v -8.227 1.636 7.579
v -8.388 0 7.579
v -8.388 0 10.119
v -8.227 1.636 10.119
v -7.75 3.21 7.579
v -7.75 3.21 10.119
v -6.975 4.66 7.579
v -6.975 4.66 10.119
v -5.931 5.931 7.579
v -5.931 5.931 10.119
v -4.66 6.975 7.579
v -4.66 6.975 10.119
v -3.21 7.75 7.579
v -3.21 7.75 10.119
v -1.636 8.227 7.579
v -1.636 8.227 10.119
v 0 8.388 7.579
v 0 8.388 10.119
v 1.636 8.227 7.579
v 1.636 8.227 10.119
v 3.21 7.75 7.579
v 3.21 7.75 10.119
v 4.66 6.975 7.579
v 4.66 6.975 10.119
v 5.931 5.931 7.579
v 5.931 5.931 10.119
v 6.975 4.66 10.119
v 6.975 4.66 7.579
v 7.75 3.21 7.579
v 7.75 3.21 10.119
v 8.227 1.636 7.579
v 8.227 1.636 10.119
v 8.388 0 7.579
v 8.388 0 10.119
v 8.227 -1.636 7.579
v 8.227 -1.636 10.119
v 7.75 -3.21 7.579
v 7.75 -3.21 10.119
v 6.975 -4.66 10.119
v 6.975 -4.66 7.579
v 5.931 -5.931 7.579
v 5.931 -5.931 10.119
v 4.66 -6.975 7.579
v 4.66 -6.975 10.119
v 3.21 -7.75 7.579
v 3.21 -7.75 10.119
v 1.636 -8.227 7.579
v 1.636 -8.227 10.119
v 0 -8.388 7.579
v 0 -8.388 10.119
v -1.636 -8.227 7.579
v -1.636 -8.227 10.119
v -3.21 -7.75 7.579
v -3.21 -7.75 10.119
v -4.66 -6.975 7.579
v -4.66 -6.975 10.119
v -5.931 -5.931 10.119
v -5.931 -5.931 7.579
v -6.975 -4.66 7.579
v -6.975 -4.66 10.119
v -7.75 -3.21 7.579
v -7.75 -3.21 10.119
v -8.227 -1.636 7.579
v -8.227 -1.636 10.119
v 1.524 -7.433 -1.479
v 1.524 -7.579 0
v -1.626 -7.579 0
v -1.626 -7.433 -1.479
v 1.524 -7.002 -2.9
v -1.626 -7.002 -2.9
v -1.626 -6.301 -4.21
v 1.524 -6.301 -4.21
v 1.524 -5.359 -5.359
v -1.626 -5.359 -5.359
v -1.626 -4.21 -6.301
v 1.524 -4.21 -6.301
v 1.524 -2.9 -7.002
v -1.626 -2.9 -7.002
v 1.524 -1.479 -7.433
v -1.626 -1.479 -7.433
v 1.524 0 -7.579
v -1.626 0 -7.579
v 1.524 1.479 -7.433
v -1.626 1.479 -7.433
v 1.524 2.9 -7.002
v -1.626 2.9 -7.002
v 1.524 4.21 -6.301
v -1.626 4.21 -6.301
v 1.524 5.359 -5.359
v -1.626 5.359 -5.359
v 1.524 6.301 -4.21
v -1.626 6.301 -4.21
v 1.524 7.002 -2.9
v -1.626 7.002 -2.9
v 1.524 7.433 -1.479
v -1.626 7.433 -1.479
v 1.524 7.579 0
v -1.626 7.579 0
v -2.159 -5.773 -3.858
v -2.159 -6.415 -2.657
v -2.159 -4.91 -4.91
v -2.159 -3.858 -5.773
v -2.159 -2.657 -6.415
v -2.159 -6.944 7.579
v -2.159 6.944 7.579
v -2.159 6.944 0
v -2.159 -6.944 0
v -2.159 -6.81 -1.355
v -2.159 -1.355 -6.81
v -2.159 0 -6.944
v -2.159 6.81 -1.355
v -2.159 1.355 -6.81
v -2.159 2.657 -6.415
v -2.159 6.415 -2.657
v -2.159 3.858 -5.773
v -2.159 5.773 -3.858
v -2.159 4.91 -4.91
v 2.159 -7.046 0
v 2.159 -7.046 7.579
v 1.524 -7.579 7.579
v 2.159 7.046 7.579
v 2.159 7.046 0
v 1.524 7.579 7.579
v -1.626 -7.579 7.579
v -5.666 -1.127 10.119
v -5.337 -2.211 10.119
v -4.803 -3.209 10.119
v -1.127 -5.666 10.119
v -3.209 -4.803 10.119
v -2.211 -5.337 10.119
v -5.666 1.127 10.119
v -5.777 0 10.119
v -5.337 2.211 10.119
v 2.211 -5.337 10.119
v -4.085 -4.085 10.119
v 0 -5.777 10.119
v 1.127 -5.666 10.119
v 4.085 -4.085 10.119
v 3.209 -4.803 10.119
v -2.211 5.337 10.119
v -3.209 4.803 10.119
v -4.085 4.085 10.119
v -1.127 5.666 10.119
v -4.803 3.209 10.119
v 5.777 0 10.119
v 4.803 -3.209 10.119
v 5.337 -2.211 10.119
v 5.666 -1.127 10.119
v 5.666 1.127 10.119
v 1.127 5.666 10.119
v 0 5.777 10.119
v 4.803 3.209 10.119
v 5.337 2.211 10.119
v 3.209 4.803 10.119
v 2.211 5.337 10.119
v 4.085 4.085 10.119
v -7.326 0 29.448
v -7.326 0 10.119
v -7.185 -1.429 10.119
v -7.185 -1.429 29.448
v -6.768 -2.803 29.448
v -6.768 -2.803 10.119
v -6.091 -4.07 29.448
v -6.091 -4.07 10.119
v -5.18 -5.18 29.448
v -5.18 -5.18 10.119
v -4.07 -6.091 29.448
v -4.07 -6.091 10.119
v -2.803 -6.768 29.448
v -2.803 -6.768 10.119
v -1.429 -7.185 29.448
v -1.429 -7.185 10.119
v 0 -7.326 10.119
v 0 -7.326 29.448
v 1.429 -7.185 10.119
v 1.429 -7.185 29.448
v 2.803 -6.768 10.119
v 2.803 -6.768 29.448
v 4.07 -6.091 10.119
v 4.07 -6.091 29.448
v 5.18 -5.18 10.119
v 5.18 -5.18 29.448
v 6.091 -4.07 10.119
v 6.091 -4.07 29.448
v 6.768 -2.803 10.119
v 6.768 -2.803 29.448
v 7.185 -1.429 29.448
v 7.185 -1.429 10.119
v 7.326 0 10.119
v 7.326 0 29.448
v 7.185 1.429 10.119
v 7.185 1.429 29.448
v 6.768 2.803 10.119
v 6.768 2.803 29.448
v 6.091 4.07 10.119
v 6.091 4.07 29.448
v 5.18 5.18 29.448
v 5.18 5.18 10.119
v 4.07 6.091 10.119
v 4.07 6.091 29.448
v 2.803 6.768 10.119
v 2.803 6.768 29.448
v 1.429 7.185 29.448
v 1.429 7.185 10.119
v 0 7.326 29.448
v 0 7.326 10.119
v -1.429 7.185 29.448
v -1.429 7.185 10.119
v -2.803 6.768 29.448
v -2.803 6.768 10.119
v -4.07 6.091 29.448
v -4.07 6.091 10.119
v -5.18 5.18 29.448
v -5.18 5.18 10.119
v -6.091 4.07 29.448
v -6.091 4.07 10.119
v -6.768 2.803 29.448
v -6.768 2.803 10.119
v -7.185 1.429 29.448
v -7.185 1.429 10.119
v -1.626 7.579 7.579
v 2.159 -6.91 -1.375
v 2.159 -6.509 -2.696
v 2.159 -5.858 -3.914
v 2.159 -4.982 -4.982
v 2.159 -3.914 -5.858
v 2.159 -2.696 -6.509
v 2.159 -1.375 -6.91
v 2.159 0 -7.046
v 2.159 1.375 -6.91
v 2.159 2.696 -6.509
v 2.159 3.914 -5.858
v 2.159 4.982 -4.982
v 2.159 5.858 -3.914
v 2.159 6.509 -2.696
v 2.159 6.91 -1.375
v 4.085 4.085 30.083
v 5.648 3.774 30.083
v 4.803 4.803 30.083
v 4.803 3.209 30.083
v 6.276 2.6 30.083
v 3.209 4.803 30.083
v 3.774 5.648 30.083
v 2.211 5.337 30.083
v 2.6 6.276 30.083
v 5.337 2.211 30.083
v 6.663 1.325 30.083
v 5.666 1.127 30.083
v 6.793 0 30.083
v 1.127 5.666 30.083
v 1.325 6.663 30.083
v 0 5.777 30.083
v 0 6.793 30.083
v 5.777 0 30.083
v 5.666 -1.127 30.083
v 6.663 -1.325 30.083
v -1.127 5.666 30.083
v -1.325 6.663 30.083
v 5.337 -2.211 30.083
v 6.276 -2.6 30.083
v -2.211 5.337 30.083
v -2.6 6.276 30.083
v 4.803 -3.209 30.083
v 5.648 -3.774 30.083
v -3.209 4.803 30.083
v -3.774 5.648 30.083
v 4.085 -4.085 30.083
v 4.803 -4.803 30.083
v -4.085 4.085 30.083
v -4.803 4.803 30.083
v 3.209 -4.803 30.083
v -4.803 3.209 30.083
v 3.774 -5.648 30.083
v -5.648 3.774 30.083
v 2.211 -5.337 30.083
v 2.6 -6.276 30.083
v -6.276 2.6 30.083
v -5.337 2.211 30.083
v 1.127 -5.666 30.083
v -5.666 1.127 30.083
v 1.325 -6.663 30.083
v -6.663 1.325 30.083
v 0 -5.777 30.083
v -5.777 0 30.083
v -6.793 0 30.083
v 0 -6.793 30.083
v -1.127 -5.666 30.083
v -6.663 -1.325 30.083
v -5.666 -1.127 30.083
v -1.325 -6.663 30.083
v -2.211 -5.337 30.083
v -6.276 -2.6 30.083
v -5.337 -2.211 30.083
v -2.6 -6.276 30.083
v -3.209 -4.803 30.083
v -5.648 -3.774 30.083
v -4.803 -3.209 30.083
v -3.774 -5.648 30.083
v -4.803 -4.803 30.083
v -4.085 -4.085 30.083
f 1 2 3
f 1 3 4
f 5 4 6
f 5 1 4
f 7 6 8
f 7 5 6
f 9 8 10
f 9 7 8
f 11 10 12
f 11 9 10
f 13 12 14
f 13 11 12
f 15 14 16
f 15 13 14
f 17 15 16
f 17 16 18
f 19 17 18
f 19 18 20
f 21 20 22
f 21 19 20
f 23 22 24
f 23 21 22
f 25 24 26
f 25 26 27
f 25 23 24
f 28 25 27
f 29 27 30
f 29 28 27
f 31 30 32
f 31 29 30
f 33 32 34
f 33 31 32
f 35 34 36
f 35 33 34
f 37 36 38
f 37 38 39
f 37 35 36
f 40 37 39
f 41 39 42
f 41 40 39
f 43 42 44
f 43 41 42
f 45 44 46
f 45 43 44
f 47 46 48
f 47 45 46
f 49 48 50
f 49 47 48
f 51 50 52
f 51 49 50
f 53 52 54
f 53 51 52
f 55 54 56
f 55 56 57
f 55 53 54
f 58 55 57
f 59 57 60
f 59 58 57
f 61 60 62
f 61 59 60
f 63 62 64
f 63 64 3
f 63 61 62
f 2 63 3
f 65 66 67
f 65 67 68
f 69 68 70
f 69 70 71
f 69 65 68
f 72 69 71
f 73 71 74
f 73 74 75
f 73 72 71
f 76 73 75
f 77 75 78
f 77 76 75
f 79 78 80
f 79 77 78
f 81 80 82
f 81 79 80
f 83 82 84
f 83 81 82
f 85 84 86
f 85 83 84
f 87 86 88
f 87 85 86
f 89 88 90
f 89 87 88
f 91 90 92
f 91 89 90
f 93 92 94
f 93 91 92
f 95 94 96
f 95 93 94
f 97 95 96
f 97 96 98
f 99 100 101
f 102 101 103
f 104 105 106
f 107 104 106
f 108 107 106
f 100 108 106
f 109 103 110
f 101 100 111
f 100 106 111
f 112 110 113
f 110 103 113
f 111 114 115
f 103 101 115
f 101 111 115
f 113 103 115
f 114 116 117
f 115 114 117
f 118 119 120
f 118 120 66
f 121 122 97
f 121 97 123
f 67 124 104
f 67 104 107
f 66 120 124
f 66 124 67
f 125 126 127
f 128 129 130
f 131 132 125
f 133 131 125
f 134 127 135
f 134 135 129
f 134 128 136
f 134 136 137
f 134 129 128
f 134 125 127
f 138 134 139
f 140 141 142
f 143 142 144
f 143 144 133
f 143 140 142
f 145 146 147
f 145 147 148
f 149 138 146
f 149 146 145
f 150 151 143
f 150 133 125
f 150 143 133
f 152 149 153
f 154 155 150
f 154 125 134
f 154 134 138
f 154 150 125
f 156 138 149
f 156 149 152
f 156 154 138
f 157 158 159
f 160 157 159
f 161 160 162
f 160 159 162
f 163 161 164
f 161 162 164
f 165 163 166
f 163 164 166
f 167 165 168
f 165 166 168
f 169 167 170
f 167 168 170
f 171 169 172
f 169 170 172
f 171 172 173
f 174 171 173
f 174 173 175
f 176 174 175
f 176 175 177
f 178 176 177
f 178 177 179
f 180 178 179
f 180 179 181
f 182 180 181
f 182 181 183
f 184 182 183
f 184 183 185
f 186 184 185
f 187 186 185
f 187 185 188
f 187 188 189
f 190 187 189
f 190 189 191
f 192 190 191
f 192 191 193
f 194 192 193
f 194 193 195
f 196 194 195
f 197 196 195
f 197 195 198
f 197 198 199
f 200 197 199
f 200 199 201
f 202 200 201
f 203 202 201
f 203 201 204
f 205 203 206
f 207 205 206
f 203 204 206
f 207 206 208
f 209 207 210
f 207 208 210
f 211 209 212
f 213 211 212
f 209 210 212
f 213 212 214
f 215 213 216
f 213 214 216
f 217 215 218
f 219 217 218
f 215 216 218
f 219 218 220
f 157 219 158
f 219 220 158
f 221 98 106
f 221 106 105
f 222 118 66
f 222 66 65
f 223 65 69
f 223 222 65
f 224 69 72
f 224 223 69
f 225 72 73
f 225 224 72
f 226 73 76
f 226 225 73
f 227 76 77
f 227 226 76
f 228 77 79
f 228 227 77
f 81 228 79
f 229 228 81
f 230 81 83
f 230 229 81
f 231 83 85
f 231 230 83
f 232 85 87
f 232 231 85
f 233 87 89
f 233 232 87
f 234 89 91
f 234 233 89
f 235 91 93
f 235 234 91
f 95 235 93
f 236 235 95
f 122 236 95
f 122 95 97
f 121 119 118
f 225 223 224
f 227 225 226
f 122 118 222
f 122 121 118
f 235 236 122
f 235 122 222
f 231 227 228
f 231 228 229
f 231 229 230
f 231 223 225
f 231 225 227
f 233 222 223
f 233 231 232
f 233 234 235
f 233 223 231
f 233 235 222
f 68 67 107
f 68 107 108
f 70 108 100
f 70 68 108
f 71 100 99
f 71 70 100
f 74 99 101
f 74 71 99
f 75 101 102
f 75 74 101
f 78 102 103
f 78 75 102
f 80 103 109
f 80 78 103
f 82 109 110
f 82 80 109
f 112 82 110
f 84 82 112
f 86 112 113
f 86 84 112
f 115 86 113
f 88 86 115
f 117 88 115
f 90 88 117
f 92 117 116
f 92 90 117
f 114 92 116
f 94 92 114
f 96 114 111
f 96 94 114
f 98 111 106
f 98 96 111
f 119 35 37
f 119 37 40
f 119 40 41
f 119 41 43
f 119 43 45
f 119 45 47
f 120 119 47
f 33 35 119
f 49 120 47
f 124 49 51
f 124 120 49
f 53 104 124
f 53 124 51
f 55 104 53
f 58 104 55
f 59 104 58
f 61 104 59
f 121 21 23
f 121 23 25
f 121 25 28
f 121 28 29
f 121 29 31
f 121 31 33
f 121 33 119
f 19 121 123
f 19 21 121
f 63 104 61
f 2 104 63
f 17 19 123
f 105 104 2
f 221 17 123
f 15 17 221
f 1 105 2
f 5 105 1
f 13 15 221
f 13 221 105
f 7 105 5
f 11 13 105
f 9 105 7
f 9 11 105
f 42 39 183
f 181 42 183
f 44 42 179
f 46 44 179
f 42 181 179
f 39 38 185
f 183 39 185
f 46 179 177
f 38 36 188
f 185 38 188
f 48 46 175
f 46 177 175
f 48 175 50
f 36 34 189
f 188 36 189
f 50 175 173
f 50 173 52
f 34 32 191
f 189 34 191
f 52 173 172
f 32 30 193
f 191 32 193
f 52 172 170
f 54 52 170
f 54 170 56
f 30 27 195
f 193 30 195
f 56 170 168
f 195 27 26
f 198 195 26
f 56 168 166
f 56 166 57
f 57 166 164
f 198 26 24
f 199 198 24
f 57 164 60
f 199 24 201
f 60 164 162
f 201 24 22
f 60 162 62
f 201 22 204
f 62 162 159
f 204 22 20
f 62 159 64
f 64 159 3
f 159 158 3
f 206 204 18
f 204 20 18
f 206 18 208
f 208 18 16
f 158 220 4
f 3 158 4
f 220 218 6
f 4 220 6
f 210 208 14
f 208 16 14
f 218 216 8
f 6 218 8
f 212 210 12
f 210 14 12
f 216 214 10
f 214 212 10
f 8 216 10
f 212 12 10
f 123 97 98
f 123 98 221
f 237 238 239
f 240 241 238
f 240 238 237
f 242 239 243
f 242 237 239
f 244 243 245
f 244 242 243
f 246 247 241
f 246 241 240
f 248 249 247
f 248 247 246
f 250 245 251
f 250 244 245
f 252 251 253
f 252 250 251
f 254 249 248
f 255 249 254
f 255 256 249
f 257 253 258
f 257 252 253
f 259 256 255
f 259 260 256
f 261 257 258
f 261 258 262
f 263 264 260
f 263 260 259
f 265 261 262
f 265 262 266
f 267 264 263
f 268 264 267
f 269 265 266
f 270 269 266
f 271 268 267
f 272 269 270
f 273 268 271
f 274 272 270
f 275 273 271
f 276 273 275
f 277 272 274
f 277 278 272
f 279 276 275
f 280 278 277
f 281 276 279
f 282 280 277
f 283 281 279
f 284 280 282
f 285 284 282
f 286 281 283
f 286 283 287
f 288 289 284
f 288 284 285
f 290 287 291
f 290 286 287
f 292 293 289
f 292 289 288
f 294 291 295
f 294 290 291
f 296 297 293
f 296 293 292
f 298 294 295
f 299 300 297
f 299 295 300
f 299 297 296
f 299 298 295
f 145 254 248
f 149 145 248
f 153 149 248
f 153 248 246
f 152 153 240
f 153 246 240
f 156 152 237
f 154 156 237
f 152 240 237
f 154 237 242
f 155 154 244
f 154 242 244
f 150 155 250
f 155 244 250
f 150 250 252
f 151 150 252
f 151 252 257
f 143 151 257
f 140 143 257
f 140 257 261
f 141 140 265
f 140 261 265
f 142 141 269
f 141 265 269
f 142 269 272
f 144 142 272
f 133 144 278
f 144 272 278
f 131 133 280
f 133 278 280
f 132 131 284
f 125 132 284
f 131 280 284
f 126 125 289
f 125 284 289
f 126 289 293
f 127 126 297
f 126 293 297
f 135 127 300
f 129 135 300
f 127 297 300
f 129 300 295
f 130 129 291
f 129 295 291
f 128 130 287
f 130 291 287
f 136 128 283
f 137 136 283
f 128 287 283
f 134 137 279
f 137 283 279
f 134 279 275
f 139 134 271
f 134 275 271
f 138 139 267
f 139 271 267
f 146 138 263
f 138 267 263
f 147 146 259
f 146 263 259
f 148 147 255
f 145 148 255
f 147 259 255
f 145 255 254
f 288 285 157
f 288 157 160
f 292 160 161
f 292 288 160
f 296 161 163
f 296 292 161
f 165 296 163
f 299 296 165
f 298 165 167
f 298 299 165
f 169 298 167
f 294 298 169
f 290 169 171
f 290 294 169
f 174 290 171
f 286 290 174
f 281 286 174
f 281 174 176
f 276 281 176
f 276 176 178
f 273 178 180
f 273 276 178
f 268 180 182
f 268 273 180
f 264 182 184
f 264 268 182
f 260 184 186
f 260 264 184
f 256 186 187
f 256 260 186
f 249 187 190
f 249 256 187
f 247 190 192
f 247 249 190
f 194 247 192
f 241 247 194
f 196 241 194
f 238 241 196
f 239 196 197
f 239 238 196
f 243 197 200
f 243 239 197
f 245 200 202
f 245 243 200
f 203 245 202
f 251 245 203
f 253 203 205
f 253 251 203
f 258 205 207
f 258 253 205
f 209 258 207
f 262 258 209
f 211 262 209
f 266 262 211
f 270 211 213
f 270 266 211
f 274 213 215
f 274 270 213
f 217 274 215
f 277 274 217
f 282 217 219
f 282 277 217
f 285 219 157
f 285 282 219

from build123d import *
from OCP.BRepFilletAPI import BRepFilletAPI_MakeChamfer

# Parameters (mm, degrees)
SKETCH1_R           = 7.325878031
EXTRUDE1_DEPTH      = 30.082981268
EXTRUDE4_DEPTH      = 32.817019656
EXTRUDE4_DEPTH_BACK = 32.817019656
SKETCH2_R           = 7.578564767
SKETCH2_5_R         = 7.578564767
EXTRUDE5_DEPTH      = 2.159
SKETCH3_R           = 8.388232563
EXTRUDE6_DEPTH      = 2.54
CHAMFER1_SIZE       = 0.635
CHAMFER1_SIZE2      = 0.532828266
CHAMFER2_SIZE       = 0.635
CHAMFER2_SIZE2      = 0.532828266
SKETCH4_R           = 5.776692344
EXTRUDE7_DEPTH      = 19.964416501


with BuildPart() as part:
    # Sketch1 → Extrude1 (new body)
    with BuildSketch(Plane.XY):
        with Locations(Location((0, 0, 0), (0, 0, 180))):
            Circle(SKETCH1_R)
    extrude(amount=EXTRUDE1_DEPTH)

    # Sketch2 → Extrude4 (cut, two sides: drawn at the far end of the back side and taken through both)
    with BuildSketch(Plane(origin=(0, 0, 0), x_dir=(0, 0, -1), z_dir=(1, 0, 0)).offset(-EXTRUDE4_DEPTH_BACK)):
        Circle(SKETCH2_R)
        with BuildLine():
            ThreePointArc((-7.578564767, 0), (-5.358854538, 5.358854538), (0, 7.578564767))
            Line((0, 7.578564767), (-7.578564767, 7.578564767))
            Line((-7.578564767, 7.578564767), (-7.578564767, 0))
        make_face()
        with BuildLine():
            ThreePointArc((0, -7.578564767), (-5.358854538, -5.358854538), (-7.578564767, 0))
            Line((-7.578564767, 0), (-7.578564767, -7.578564767))
            Line((-7.578564767, -7.578564767), (0, -7.578564767))
        make_face()
    extrude(amount=EXTRUDE4_DEPTH + EXTRUDE4_DEPTH_BACK, mode=Mode.SUBTRACT)

    # Sketch2<5> → Extrude5 (add, symmetric)
    with BuildSketch(Plane(origin=(0, 0, 0), x_dir=(0, 0, -1), z_dir=(1, 0, 0))):
        with BuildLine():
            ThreePointArc((-7.578564767, 0), (-5.358854538, 5.358854538), (0, 7.578564767))
            Line((0, 7.578564767), (-7.578564767, 7.578564767))
            Line((-7.578564767, 7.578564767), (-7.578564767, 0))
        make_face()
        Circle(SKETCH2_5_R)
        with BuildLine():
            ThreePointArc((0, -7.578564767), (-5.358854538, -5.358854538), (-7.578564767, 0))
            Line((-7.578564767, 0), (-7.578564767, -7.578564767))
            Line((-7.578564767, -7.578564767), (0, -7.578564767))
        make_face()
    extrude(amount=EXTRUDE5_DEPTH, both=True)

    # Sketch3 → Extrude6 (add)
    with BuildSketch(Plane(origin=(0, 0, 7.578564767), x_dir=(-1, 0, 0), z_dir=(0, 0, -1))):
        Circle(SKETCH3_R)
    extrude(amount=-EXTRUDE6_DEPTH)

    # Chamfer1: one chamfer whose edges measure the first distance from different faces: ONE call of the kernel's chamfer builder (chamfer() names one face for all edges)
    chamfer1_edges_1 = [part.edges().sort_by_distance(p)[0] for p in [
        (-2.159, -7.578564767, 3.789282384),
        (-2.159, 0, -7.578564767),
        (-2.159, 7.578564767, 3.789282384),
    ]]
    chamfer1_side_1 = [part.faces().sort_by_distance(p)[0] for p in [
        (-2.159, 0, 0.707457952),
    ]]
    chamfer1_edges_2 = [part.edges().sort_by_distance(p)[0] for p in [
        (2.159, -7.578564767, 3.789282384),
    ]]
    chamfer1_side_2 = [part.faces().sort_by_distance(p)[0] for p in [
        (0, -7.578564767, 3.789282384),
    ]]
    chamfer1_edges_3 = [part.edges().sort_by_distance(p)[0] for p in [
        (2.159, 0, -7.578564767),
    ]]
    chamfer1_side_3 = [part.faces().sort_by_distance(p)[0] for p in [
        (0, 0, -7.578564767),
    ]]
    chamfer1_edges_4 = [part.edges().sort_by_distance(p)[0] for p in [
        (2.159, 7.578564767, 3.789282384),
    ]]
    chamfer1_side_4 = [part.faces().sort_by_distance(p)[0] for p in [
        (0, 7.578564767, 3.789282384),
    ]]
    chamfer1 = BRepFilletAPI_MakeChamfer(part.part.solid().wrapped)
    for e in chamfer1_edges_1:
        chamfer1.Add(CHAMFER1_SIZE, CHAMFER1_SIZE2, e.wrapped, chamfer1_side_1[0].wrapped)  # the first distance lies on this face
    for e in chamfer1_edges_2:
        chamfer1.Add(CHAMFER1_SIZE, CHAMFER1_SIZE2, e.wrapped, chamfer1_side_2[0].wrapped)  # the first distance lies on this face
    for e in chamfer1_edges_3:
        chamfer1.Add(CHAMFER1_SIZE, CHAMFER1_SIZE2, e.wrapped, chamfer1_side_3[0].wrapped)  # the first distance lies on this face
    for e in chamfer1_edges_4:
        chamfer1.Add(CHAMFER1_SIZE, CHAMFER1_SIZE2, e.wrapped, chamfer1_side_4[0].wrapped)  # the first distance lies on this face
    add(Compound.cast(chamfer1.Shape()), mode=Mode.REPLACE)

    # Chamfer2
    chamfer2_edges = [part.edges().sort_by_distance(p)[0] for p in [
        (7.325878031, 0, 30.082981268),
    ]]
    chamfer2_side = [part.faces().sort_by_distance(p)[0] for p in [
        (7.325878031, 0, 20.100773018),
    ]]
    chamfer(chamfer2_edges, length=CHAMFER2_SIZE, length2=CHAMFER2_SIZE2, reference=chamfer2_side[0])

    # Sketch4 → Extrude7 (cut)
    with BuildSketch(Plane.XY.offset(30.082981268)):
        Circle(SKETCH4_R)
    extrude(amount=-EXTRUDE7_DEPTH, mode=Mode.SUBTRACT)


solid = part.part
